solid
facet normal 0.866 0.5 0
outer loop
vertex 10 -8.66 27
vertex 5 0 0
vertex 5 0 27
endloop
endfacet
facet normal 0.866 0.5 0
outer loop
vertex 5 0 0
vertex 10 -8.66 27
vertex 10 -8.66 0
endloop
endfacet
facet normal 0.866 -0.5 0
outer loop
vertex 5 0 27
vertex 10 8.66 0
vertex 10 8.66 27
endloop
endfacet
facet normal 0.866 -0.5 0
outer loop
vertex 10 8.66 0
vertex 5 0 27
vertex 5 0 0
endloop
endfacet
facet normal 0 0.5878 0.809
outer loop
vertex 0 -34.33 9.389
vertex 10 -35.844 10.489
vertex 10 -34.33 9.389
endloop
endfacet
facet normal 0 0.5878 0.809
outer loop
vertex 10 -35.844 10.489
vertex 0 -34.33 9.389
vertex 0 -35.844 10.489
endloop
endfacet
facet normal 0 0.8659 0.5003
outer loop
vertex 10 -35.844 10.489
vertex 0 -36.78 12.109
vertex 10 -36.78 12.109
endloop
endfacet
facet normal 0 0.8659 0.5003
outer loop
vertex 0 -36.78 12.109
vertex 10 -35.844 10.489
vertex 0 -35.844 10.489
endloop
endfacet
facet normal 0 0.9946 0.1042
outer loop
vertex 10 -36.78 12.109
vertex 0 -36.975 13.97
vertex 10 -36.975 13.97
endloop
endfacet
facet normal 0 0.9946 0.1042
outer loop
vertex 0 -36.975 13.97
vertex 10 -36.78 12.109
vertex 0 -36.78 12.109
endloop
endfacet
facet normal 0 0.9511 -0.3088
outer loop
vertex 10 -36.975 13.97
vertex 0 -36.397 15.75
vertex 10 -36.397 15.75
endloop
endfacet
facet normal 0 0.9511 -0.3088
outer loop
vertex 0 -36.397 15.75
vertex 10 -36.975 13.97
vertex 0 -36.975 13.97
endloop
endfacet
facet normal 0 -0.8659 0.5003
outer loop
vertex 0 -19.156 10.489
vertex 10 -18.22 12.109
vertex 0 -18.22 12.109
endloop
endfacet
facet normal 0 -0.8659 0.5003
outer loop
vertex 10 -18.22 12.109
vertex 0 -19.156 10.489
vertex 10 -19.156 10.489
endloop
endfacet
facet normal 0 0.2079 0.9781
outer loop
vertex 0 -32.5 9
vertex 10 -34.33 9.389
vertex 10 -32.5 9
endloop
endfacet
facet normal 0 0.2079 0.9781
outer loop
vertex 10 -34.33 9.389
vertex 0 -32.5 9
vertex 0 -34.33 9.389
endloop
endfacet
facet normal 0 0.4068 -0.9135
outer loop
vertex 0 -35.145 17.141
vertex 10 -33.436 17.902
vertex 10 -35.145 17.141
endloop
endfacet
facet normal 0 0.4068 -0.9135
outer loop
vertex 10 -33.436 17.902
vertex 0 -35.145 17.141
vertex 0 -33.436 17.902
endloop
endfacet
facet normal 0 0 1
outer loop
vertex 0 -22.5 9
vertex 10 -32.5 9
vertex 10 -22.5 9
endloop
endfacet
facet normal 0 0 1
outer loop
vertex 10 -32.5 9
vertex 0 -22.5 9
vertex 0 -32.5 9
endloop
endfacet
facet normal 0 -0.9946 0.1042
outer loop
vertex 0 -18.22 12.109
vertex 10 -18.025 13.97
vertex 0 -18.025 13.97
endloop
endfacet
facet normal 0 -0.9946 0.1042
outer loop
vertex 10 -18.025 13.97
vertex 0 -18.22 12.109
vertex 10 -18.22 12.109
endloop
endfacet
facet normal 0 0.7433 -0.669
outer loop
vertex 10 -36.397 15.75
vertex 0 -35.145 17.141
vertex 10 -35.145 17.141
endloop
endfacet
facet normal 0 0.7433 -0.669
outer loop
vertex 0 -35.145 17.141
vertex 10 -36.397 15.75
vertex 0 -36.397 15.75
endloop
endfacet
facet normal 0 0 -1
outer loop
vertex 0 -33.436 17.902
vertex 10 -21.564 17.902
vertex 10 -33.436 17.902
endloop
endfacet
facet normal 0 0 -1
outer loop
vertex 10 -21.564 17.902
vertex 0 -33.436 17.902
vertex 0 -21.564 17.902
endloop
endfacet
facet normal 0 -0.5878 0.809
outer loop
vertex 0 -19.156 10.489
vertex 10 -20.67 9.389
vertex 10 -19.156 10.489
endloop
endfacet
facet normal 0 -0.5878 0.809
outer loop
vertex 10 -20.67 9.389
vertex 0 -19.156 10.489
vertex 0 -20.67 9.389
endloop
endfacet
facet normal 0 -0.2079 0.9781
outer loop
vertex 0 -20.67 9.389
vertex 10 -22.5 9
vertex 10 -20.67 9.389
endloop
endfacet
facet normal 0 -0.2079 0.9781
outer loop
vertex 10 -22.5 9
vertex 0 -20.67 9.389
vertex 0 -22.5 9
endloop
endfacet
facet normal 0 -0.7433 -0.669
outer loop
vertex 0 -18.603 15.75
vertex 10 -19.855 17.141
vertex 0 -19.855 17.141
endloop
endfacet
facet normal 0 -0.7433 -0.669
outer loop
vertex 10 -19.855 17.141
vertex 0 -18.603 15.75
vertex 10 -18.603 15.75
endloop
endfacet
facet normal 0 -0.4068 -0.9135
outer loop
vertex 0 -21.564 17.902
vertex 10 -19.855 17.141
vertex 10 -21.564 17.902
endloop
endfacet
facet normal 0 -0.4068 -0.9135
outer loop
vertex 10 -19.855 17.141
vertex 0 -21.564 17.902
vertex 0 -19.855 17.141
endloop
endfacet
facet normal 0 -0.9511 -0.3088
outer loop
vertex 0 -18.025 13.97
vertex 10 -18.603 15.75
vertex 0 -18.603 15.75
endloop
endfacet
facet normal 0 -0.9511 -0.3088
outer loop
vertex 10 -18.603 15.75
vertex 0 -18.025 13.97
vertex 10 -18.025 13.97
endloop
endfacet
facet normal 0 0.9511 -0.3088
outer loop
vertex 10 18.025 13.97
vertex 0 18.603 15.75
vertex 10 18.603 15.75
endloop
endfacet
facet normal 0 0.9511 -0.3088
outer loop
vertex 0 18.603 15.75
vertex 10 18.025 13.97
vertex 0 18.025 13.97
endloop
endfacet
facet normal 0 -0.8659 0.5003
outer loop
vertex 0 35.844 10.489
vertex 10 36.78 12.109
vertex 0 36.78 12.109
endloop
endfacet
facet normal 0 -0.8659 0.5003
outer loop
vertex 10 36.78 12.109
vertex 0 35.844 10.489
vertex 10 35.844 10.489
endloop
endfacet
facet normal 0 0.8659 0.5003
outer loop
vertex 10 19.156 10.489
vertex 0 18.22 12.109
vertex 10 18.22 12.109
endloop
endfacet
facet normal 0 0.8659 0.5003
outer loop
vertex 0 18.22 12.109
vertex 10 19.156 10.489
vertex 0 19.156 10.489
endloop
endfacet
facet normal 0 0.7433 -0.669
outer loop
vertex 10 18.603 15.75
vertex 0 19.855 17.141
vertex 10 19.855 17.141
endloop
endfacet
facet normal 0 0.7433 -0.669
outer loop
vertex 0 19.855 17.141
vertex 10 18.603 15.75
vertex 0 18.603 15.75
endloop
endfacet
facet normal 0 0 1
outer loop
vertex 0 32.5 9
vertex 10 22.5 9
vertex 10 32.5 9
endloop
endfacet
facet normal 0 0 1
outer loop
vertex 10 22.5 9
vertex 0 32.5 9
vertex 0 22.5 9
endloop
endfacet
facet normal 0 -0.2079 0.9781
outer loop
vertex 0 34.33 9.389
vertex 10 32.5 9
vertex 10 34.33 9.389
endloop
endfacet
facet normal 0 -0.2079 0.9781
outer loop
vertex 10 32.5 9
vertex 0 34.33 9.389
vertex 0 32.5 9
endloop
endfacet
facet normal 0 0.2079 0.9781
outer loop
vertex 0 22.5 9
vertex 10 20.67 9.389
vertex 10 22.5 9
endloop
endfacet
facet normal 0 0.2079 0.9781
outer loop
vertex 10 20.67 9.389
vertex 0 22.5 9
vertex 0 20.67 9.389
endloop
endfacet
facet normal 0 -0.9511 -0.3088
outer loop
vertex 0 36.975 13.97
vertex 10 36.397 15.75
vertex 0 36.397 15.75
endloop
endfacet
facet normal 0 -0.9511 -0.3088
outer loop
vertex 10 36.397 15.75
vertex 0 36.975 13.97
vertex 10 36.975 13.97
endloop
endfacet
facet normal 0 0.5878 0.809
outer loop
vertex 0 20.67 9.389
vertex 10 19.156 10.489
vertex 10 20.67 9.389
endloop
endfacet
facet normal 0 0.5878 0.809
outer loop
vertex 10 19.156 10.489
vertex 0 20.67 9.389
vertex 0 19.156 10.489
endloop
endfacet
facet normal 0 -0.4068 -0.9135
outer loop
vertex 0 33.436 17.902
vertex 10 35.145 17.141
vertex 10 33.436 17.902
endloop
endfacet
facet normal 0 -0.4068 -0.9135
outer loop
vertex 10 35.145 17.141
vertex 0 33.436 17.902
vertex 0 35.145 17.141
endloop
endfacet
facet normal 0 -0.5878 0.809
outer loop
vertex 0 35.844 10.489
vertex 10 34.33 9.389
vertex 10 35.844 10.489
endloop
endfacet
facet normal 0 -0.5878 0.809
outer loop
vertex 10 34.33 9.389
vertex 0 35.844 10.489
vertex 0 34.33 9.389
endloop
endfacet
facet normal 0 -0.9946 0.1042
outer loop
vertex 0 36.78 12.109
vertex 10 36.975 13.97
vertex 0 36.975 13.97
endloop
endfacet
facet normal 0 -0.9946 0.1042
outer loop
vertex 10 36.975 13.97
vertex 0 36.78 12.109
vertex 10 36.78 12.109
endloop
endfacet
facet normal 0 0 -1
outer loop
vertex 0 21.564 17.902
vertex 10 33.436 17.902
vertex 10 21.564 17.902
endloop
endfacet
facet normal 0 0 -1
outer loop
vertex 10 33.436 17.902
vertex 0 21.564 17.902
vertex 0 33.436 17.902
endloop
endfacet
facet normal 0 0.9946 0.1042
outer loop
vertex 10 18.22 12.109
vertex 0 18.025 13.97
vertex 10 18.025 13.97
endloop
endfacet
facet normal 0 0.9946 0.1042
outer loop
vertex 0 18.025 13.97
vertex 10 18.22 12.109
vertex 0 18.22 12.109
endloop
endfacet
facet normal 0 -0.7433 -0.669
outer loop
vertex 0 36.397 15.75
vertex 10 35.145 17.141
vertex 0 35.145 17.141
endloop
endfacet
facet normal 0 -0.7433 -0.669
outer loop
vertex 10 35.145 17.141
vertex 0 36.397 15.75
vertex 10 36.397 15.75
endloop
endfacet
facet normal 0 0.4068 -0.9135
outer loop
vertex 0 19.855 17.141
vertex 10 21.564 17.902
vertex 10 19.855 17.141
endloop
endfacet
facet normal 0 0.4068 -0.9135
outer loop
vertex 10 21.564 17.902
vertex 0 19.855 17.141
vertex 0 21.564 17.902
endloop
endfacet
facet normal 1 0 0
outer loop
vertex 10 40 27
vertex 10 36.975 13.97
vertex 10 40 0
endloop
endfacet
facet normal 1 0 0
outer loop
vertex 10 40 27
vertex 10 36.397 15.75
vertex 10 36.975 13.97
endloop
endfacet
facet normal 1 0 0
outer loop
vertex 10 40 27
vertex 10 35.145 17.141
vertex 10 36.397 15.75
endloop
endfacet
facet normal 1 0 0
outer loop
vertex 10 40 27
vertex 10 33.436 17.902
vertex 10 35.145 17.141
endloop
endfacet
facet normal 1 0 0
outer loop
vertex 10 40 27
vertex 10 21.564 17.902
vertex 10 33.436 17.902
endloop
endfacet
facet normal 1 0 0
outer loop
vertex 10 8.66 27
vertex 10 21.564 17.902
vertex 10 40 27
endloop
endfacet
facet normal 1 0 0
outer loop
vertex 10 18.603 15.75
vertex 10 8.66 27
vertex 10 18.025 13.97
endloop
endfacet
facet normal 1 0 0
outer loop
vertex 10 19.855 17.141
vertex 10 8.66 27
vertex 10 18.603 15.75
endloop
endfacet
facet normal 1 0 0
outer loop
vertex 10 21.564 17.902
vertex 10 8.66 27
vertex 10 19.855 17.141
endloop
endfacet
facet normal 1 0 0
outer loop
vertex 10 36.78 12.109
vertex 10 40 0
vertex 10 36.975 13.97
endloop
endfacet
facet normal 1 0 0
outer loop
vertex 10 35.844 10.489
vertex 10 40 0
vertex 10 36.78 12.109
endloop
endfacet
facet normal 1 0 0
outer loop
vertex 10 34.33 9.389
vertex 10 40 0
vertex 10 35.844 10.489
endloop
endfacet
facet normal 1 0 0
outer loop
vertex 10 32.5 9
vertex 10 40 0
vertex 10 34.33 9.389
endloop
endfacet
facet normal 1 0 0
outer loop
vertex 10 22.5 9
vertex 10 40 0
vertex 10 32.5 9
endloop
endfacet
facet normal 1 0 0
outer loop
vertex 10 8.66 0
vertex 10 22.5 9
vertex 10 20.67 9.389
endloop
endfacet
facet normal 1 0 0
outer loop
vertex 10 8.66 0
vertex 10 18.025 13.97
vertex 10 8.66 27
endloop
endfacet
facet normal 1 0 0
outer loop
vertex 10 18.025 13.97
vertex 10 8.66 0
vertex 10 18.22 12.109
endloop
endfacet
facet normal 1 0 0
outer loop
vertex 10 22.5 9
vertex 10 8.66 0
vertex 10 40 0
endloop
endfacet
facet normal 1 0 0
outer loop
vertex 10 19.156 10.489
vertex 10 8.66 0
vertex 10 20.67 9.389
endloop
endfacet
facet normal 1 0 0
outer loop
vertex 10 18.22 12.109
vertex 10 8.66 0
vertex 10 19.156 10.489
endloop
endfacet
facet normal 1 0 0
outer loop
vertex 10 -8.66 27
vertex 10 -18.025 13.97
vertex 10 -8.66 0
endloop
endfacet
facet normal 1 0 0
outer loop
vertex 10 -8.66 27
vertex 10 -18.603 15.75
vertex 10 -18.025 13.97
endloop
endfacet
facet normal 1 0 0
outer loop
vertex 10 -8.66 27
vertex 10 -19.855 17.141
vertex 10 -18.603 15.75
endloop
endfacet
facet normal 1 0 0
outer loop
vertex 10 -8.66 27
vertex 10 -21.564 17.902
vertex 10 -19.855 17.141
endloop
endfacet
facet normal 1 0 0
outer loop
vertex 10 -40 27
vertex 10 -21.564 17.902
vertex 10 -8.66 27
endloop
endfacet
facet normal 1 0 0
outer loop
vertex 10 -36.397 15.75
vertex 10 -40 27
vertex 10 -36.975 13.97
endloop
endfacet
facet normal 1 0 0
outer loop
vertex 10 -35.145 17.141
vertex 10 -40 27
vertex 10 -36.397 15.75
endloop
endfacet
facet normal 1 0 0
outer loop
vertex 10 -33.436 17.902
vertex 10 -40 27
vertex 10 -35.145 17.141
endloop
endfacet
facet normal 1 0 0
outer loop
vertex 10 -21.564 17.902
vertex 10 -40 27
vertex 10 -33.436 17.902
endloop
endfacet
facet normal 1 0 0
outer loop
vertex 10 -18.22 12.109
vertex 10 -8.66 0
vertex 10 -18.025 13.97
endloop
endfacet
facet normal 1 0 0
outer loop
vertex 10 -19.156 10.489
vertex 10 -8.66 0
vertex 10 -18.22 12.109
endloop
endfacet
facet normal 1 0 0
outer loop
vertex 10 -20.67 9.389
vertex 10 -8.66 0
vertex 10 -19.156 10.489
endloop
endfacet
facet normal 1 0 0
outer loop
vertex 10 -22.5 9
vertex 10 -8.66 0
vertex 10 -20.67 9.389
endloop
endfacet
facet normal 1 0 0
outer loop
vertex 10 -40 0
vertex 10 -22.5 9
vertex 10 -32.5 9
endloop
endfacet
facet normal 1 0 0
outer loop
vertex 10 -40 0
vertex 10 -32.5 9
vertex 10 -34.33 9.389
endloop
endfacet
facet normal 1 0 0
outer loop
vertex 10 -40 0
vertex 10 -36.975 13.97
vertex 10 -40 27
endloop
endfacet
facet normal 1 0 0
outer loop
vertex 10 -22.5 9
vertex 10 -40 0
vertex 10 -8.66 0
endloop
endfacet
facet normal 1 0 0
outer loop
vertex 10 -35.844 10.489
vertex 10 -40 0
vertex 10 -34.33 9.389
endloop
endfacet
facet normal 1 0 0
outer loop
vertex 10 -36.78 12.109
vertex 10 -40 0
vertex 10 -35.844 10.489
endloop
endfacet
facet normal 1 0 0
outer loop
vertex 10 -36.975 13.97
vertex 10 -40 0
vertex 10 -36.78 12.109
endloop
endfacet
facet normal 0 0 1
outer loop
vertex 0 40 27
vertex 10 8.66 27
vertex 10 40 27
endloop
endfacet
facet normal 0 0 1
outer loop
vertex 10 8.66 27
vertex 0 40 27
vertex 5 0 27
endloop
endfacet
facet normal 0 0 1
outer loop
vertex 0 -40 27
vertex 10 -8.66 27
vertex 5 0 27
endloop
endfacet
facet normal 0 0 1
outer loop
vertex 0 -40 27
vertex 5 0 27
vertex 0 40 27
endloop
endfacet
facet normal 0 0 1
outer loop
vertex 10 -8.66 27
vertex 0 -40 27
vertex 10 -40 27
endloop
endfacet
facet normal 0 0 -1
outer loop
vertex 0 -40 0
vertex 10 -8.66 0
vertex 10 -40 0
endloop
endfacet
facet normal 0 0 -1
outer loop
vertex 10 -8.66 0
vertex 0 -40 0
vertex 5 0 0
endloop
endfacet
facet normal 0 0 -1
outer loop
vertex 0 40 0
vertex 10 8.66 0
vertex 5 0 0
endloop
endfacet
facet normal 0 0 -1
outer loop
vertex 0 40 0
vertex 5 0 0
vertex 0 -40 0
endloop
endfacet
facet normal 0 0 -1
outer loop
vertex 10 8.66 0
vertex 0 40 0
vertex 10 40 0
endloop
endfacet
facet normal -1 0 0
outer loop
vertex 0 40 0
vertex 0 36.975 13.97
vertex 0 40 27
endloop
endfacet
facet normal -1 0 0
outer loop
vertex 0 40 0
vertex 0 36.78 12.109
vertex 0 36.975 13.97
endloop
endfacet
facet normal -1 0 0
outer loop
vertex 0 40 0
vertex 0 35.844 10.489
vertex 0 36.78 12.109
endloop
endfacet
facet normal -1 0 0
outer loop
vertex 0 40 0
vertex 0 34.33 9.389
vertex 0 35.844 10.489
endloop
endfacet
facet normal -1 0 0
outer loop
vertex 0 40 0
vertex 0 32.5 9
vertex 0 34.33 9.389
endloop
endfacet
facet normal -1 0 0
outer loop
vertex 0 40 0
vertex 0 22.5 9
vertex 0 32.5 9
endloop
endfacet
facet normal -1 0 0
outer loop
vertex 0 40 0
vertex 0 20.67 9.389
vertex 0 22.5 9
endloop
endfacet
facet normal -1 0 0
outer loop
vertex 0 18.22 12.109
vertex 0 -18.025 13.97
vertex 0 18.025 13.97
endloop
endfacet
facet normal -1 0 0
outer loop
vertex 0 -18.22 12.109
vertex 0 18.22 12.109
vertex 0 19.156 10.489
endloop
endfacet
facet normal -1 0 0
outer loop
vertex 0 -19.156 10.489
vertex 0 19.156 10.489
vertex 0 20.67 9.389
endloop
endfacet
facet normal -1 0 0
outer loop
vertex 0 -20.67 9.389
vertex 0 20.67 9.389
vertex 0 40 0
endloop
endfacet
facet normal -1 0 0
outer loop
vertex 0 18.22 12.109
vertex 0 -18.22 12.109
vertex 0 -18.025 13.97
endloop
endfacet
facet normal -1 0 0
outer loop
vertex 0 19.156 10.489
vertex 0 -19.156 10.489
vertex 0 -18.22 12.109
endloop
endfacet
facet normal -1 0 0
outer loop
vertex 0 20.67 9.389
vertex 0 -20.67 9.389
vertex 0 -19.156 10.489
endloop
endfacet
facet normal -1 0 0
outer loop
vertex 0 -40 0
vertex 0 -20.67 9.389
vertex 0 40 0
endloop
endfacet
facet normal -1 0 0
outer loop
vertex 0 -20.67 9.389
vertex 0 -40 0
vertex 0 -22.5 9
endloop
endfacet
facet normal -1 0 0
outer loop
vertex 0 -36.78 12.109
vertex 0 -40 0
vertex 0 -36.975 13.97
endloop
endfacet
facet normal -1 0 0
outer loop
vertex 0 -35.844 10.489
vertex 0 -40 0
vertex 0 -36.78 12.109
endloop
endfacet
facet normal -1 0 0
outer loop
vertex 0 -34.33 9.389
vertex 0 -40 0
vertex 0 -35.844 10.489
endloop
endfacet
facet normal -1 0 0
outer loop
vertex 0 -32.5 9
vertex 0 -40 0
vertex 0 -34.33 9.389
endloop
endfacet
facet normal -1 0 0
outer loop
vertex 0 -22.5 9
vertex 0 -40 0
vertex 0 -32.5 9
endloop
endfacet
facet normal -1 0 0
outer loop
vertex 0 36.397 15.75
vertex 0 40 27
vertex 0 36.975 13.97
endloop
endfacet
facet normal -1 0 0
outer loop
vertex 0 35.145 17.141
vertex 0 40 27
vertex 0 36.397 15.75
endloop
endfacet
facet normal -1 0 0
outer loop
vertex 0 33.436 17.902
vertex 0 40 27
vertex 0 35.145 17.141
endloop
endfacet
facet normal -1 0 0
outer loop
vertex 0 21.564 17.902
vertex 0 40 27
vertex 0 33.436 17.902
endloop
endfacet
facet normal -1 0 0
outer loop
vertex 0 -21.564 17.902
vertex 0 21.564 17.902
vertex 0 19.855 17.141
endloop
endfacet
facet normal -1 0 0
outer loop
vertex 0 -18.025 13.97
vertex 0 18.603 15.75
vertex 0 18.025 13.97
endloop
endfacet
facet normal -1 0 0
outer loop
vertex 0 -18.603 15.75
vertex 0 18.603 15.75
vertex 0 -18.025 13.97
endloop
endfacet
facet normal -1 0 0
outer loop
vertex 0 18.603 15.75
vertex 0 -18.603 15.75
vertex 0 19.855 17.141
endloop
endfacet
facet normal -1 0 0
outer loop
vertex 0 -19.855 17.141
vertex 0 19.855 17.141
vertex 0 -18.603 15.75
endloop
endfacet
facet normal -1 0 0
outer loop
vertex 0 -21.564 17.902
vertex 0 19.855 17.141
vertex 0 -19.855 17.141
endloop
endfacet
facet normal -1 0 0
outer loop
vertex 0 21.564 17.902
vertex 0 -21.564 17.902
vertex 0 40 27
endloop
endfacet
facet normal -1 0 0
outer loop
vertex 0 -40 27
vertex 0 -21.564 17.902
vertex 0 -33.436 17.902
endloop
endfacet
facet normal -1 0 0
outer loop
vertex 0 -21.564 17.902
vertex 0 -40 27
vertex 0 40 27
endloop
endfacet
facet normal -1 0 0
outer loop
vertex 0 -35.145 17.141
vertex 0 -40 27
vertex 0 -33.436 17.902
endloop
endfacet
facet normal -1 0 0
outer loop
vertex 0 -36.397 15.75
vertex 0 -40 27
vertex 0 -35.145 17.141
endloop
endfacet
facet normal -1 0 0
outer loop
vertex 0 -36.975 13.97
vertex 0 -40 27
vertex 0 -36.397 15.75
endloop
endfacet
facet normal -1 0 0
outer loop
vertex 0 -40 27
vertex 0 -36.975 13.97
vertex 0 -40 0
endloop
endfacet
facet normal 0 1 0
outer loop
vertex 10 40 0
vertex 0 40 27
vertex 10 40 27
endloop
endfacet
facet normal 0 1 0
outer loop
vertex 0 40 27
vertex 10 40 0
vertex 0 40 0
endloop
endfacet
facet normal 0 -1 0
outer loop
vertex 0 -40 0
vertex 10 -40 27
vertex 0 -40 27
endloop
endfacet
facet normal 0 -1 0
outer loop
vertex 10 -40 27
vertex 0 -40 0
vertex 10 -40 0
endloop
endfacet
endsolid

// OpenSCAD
// file: util.scad
/**
 * A groove for a pair of wires
 * @param diameter of wire
 * @param length of each wire groove
 * @param angle in degrees
 */
module vpole_groove(
  d=5,
  l=10,
  angle=120
) {
  union() {
    for (i = [-1, 1]) {
      translate([0, 0, d/2])
      rotate([0, 0, -i * angle * 0.5])
      rotate([90, 0, 0]) {
        cylinder(r=d/2, h=l);
        translate([0,d/4, l/2])
          cube([d, d/2, l], center=true);
      }
    }
    cylinder(r=d, d);
  }
}

module fillet(r=10, h=100, extra=0) {
  difference() {
    translate([0-extra, 0-extra, 0])
      cube([r+extra, r+extra, h]);
    translate([r, r, -1])
      cylinder(r=r, h=h+2);
  }
}
// main file
use <util.scad>

module vblock_pole_clamp(
  angle=120,         // angle of the clamp
  h=27,              // height or thickness
  w=80,              // overall width of clamp (x axis)
  d=10,              // depth of clamp (y axis)
  offset=5,          // defines thickness at the deepest part of the v
  bolt_center=45,    // distance between bolt centers (min)
  bolt_diameter=9,  // clearance diameter of bolts
  bolt_slot=10,      // slot bolt holes (0 is a circular hole)
  $e=1
) {
  difference() {

    // Main cube
    translate([0, w/-2, 0])
      cube([d, w, h]);

    // V slot
    for (i = [-1, 1]) {
    translate([offset, 0, 0])
    rotate([0,0, i*((max(90,angle)-90)/2) - 45])
      translate([0,0,-1*$e]) cube([2*w, 2*w, h + 2*$e]);
    }

    // Bolt Holes
    translate([0, 0, h/2])
    rotate([0, 90, 0]) {
      for (i = [-1, 1]) {
        translate([0, i * bolt_center/2, 0]) {
          hull() {
            scale([1, i, 1])
            translate([0, bolt_slot,0-$e]) cylinder(r=bolt_diameter/2, h=d+(2*$e));
            cylinder(r=bolt_diameter/2, h=d+(2*$e));
          };
        }
      }
    }

  }
}

vblock_pole_clamp();
